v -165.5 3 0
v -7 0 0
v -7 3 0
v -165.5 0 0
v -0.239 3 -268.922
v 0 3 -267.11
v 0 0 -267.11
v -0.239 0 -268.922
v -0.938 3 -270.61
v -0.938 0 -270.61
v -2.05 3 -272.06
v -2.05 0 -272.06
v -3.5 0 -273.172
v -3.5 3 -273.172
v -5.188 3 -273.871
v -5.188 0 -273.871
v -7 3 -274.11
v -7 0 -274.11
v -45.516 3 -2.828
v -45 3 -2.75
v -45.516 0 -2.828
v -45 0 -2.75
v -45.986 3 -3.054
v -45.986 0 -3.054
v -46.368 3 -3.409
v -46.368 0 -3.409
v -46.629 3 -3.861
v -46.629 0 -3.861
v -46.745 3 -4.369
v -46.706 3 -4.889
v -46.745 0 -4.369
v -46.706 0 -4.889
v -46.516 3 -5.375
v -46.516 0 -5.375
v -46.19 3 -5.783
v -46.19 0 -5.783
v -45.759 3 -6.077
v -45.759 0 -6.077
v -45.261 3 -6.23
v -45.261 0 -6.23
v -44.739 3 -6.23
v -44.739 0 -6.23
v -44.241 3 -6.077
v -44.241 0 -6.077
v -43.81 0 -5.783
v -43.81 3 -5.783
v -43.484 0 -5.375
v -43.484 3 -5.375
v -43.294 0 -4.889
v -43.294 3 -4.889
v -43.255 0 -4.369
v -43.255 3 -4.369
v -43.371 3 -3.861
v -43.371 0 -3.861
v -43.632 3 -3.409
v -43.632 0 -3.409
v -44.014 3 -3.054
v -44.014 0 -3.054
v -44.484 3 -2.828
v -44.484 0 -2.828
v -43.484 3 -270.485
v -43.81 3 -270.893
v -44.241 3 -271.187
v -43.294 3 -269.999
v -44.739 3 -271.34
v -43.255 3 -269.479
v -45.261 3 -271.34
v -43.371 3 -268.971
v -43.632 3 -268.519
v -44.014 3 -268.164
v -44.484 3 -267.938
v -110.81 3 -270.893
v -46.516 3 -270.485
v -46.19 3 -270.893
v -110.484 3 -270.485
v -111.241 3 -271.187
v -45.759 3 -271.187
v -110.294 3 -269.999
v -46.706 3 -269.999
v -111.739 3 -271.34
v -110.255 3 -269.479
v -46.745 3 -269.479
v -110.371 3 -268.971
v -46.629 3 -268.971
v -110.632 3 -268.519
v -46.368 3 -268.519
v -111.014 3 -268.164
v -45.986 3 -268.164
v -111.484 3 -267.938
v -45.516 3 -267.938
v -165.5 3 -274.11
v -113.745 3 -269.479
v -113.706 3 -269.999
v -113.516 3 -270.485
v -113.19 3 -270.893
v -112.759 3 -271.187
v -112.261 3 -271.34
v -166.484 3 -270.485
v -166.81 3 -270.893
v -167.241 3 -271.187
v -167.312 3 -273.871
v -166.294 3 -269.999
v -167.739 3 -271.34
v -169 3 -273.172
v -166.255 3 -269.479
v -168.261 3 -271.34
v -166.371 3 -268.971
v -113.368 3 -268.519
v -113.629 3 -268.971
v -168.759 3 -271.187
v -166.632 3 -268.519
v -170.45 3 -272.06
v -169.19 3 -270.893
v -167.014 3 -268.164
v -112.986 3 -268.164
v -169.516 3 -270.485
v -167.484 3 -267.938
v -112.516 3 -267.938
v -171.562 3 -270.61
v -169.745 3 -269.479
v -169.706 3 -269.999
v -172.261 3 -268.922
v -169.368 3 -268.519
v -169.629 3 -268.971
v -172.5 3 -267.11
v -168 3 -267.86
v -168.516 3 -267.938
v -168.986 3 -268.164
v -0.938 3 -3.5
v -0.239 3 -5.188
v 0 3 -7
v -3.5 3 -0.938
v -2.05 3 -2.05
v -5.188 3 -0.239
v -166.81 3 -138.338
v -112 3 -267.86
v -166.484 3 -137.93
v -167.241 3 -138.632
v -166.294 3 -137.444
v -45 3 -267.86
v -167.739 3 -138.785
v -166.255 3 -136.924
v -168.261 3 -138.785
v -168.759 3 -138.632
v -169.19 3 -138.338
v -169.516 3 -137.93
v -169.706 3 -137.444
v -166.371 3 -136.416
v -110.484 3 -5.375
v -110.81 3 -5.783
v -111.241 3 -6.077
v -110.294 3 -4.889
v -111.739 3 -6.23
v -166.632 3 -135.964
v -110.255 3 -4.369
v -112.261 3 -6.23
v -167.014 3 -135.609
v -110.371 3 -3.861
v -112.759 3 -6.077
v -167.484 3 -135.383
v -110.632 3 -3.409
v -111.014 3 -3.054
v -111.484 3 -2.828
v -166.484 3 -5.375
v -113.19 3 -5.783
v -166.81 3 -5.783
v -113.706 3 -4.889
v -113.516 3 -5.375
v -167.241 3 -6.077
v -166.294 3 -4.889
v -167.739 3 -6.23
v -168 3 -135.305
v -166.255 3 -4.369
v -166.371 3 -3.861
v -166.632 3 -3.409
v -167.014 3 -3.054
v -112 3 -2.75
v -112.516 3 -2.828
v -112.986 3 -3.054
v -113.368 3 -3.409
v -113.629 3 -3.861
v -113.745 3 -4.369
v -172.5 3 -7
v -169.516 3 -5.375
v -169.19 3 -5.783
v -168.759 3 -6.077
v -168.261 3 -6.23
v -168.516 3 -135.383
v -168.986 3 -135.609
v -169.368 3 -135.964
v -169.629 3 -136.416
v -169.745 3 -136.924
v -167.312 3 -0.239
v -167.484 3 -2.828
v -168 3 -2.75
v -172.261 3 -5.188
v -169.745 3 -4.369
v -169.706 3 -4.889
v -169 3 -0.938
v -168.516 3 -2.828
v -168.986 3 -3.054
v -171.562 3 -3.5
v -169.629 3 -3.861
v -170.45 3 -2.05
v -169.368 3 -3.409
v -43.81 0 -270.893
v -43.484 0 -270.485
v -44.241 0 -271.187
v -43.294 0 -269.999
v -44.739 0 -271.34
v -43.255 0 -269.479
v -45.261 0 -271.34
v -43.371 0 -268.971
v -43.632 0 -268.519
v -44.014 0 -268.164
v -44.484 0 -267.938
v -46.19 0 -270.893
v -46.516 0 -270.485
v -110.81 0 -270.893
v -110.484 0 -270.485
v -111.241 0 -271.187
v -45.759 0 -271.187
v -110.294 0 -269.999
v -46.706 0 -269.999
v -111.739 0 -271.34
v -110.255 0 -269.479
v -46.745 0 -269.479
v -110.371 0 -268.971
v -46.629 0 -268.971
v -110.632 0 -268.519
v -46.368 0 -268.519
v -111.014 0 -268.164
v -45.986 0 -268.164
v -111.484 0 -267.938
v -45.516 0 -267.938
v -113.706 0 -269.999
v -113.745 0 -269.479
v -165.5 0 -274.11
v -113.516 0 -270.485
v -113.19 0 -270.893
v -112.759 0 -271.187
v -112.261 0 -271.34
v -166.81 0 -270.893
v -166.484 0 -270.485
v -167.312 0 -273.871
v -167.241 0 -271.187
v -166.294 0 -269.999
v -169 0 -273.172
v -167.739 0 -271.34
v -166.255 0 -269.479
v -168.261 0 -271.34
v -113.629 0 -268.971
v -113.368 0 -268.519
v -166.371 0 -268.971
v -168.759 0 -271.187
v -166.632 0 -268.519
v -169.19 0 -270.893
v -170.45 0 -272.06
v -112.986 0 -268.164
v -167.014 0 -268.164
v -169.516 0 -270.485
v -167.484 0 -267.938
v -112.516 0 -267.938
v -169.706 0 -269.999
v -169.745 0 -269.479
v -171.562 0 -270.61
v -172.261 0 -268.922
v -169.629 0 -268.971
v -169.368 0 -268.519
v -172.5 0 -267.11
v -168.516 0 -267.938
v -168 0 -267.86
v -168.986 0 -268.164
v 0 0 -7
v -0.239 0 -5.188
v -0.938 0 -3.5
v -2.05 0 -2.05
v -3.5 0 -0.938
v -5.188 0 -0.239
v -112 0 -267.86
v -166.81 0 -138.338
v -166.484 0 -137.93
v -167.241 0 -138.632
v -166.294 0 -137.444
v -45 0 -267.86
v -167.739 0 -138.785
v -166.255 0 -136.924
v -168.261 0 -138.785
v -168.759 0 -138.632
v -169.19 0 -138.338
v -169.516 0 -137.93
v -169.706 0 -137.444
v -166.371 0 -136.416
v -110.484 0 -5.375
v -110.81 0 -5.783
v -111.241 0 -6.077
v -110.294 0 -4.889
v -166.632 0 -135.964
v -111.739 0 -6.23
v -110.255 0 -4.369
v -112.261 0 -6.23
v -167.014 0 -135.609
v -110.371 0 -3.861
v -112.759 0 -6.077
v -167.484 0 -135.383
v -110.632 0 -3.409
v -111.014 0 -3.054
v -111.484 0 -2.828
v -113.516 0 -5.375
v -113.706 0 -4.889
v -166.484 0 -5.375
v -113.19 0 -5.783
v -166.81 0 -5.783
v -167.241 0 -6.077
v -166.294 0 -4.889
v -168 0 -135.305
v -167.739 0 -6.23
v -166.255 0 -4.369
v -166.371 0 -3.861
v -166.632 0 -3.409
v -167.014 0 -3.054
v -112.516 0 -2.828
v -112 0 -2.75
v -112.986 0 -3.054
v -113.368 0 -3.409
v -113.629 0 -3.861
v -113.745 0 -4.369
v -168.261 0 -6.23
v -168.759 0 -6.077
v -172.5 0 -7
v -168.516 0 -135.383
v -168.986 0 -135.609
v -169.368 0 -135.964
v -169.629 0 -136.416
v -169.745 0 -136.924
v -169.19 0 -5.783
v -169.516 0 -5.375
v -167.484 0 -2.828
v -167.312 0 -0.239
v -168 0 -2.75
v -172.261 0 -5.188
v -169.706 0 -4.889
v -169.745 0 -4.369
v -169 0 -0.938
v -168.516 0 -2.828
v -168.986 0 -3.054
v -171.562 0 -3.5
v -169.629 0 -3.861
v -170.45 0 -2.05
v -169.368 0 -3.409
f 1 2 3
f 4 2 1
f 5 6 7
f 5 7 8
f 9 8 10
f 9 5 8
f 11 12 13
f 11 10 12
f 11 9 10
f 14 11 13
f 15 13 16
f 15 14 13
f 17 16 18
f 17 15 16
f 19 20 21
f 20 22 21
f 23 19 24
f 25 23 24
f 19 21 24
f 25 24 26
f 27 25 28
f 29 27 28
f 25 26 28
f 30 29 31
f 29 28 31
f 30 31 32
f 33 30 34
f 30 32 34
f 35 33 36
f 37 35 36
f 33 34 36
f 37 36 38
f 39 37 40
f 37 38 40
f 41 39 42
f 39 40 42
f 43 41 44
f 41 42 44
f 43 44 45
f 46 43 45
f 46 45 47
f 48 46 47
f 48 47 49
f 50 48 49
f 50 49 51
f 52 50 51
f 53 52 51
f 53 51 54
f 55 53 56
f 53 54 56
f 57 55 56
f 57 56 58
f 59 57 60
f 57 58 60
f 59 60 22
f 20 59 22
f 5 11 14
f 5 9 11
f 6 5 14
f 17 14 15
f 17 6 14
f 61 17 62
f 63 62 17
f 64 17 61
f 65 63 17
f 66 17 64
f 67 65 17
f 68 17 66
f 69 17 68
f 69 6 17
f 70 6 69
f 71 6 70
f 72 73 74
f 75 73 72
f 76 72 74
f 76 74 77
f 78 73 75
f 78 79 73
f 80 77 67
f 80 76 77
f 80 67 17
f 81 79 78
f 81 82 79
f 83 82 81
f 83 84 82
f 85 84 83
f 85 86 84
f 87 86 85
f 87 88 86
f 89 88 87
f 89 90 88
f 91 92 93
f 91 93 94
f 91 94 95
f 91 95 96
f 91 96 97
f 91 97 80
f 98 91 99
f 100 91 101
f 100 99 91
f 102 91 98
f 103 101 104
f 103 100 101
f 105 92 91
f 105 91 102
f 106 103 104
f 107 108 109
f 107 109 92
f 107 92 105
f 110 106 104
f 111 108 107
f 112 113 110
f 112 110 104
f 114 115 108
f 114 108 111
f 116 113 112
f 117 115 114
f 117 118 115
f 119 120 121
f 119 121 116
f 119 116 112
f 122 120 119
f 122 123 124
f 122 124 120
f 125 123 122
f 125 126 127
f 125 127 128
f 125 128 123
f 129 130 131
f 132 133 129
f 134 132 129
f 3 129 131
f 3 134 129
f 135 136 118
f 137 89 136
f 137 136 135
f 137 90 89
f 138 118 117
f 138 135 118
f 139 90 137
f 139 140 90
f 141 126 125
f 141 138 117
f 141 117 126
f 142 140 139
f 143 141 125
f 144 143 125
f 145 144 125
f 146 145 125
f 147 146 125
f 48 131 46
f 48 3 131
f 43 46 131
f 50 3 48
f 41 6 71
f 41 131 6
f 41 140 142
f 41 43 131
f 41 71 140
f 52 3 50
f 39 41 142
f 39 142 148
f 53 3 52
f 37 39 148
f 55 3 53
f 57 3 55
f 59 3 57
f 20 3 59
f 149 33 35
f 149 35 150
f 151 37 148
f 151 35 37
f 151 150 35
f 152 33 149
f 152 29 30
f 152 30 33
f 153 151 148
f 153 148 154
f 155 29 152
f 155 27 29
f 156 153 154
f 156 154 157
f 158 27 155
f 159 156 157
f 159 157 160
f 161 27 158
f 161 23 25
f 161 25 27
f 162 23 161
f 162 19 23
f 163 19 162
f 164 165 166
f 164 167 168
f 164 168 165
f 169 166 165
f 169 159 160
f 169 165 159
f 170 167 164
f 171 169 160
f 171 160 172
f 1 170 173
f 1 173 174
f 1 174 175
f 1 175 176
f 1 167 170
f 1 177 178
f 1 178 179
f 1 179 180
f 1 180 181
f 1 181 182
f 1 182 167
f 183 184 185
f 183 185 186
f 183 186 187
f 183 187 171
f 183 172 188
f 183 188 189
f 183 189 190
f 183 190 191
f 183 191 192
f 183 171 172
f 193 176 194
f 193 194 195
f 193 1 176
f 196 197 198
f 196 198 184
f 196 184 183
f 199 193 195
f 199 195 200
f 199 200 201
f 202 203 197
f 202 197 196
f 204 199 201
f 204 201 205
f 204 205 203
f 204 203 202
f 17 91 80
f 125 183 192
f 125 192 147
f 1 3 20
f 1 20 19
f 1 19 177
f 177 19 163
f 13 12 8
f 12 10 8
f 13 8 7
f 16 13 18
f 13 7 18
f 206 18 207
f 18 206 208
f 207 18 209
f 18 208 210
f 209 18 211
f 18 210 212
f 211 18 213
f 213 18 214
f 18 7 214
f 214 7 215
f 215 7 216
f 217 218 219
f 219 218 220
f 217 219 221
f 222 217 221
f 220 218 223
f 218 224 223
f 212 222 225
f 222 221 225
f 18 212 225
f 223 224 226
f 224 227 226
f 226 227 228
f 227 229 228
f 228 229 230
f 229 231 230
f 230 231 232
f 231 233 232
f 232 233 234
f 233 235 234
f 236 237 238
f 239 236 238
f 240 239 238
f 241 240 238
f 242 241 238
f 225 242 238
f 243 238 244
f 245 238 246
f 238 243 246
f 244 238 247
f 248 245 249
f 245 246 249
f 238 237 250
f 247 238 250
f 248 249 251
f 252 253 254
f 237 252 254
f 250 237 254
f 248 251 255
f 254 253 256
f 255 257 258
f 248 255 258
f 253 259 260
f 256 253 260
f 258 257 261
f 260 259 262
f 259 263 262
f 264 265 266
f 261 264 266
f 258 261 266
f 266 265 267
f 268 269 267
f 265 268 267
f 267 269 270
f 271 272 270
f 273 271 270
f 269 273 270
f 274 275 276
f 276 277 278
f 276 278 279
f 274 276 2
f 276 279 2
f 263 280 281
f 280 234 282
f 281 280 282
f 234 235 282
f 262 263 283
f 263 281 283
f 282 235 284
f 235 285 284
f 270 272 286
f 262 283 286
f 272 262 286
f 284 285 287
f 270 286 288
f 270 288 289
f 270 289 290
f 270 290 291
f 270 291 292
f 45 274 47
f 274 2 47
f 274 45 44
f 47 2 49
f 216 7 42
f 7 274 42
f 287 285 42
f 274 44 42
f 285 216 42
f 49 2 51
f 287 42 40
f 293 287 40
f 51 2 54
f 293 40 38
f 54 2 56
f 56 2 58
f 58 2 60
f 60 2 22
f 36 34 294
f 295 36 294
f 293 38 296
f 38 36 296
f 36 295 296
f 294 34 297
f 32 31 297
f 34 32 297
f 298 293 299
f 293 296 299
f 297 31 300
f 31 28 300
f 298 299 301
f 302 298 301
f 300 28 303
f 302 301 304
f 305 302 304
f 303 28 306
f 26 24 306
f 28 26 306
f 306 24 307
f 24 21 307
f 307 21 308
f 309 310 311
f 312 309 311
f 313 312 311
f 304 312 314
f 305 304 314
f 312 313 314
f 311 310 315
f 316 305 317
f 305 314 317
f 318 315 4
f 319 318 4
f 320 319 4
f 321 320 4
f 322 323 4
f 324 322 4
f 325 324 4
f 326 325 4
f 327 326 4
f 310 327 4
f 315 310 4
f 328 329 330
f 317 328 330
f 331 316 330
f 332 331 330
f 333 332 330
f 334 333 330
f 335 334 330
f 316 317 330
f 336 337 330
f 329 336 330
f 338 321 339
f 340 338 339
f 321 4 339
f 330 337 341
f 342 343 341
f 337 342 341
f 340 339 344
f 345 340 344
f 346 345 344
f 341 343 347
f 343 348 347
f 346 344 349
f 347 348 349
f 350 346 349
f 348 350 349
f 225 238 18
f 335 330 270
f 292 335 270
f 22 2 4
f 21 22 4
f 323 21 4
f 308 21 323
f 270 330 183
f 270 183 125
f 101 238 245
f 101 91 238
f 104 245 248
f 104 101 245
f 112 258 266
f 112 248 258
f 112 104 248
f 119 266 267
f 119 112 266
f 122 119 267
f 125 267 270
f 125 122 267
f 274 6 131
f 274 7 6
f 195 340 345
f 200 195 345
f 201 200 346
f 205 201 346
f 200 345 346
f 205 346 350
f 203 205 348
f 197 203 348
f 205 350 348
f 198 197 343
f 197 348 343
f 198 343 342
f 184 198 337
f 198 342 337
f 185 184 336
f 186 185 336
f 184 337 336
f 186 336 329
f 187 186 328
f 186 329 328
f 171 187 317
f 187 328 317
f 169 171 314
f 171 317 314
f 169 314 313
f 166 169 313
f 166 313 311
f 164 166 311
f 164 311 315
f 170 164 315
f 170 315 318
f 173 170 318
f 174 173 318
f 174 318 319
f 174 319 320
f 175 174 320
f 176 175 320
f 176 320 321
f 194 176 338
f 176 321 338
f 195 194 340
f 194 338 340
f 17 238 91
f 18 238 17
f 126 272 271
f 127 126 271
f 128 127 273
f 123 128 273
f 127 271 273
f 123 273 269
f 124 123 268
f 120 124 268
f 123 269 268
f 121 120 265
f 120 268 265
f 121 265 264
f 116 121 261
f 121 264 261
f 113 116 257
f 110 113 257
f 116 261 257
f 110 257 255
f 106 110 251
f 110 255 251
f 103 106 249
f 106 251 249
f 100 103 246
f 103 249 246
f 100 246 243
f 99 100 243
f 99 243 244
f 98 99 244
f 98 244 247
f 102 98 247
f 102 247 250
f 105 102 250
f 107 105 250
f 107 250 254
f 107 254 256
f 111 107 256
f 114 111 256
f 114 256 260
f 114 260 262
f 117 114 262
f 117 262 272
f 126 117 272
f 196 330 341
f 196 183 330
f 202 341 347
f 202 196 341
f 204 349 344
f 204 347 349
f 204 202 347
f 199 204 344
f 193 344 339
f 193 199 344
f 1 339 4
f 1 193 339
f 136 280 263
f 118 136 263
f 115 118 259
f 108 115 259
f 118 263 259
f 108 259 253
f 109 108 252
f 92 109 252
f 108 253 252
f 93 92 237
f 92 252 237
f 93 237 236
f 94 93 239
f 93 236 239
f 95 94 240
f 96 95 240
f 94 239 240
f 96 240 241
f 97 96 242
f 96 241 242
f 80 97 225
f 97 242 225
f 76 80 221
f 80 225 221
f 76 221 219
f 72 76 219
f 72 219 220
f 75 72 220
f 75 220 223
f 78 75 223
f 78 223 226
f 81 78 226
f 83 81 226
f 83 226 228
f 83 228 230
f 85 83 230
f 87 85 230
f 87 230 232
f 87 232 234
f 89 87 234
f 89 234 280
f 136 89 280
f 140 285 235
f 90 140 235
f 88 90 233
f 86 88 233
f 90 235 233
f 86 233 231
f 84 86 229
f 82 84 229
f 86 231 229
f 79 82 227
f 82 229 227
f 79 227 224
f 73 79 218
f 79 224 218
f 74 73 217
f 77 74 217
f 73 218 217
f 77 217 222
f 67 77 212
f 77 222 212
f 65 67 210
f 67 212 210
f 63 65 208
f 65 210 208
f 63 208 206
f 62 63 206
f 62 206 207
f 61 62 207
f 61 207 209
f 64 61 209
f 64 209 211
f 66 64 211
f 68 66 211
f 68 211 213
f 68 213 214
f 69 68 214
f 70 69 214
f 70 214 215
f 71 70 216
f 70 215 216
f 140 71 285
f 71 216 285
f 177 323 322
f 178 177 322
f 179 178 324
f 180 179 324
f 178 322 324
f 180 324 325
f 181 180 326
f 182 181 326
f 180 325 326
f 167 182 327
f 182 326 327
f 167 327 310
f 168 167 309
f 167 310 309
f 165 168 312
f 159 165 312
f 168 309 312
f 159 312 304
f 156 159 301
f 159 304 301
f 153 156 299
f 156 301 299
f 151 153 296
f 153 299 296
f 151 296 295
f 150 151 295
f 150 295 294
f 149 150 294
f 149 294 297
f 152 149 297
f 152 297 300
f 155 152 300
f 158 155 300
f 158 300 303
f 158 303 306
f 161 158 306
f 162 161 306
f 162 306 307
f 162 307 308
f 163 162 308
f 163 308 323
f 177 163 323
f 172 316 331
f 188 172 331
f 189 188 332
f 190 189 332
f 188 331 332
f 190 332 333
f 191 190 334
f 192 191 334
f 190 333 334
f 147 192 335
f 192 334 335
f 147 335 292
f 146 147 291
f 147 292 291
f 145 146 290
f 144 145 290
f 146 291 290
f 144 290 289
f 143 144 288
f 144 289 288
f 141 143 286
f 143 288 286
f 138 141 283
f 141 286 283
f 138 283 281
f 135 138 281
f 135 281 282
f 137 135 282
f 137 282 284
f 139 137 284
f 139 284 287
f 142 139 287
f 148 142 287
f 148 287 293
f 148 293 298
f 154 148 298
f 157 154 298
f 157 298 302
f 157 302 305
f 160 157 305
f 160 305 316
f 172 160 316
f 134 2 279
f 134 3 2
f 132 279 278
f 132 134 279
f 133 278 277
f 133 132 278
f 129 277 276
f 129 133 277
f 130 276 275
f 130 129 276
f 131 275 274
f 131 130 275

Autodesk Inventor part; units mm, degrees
ref_plane "YZ Plane" through (0, 0, 0) normal (1, 0, 0) x (0, 1, 0)
ref_plane "XZ Plane" through (0, 0, 0) normal (0, 1, 0) x (-1, 0, 0)
ref_plane "XY Plane" through (0, 0, 0) normal (0, 0, 1) x (1, 0, 0)
sketch "Sketch1" plane through (0, 0, 0) normal (0, 1, 0) x (-1, 0, 0)
  line L0 (0, 0) -> (172.5, 0)
  line L1 (172.5, 0) -> (172.5, -274.11)
  line L2 (172.5, -274.11) -> (0, -274.11)
  line L3 (0, -274.11) -> (0, 0)
  dimension "d0" = 274.11
  dimension "d1" = 172.5
extrude "Extrusion1" add sketch "Sketch1" along normal blind 3
fillet "Fillet1" radius 7 4 edges at (-172.5, 1.5, 0) (0, 1.5, 0) (-172.5, 1.5, -274.11) (0, 1.5, -274.11)
sketch "Sketch2" plane through (0, 3, 0) normal (0, 1, 0) x (1, 0, 0)
  line L0 (-168, 4.5) -> (-45, 4.5) construction
  line L1 (-45, 4.5) -> (-45, 269.61) construction
  line L2 (-45, 269.61) -> (-168, 269.61) construction
  line L3 (-168, 269.61) -> (-168, 4.5) construction
  line L4 (-172.5, 267.11) -> (-172.5, 7) projected
  line L5 (-172.5, 137.055) -> (0, 137.055) construction
  line L6 (0, 7) -> (0, 267.11) projected
  line L7 (-7, 274.11) -> (-165.5, 274.11) projected
  line L8 (-86.25, 274.11) -> (-86.25, 0) construction
  line L9 (-165.5, 0) -> (-7, 0) projected
  line L10 (-112, 269.61) -> (-112, 4.5) construction
  point P0 (0, 0)
  point P1 (-168, 137.055)
  point P2 (-168, 137.055)
  dimension "d12" = 265.11
  dimension "d13" = 4.5
  dimension "d14" = 123
  dimension "d15" = 67
hole "Hole1" at (-168, 3, -4.5) at (-112, 3, -4.5) at (-45, 3, -4.5) at (-168, 3, -137.055) at (-168, 3, -269.61) at (-112, 3, -269.61) at (-45, 3, -269.61) direction (0, -1, 0) diameter 3.5 depth 3
properties part number "back_plate"
